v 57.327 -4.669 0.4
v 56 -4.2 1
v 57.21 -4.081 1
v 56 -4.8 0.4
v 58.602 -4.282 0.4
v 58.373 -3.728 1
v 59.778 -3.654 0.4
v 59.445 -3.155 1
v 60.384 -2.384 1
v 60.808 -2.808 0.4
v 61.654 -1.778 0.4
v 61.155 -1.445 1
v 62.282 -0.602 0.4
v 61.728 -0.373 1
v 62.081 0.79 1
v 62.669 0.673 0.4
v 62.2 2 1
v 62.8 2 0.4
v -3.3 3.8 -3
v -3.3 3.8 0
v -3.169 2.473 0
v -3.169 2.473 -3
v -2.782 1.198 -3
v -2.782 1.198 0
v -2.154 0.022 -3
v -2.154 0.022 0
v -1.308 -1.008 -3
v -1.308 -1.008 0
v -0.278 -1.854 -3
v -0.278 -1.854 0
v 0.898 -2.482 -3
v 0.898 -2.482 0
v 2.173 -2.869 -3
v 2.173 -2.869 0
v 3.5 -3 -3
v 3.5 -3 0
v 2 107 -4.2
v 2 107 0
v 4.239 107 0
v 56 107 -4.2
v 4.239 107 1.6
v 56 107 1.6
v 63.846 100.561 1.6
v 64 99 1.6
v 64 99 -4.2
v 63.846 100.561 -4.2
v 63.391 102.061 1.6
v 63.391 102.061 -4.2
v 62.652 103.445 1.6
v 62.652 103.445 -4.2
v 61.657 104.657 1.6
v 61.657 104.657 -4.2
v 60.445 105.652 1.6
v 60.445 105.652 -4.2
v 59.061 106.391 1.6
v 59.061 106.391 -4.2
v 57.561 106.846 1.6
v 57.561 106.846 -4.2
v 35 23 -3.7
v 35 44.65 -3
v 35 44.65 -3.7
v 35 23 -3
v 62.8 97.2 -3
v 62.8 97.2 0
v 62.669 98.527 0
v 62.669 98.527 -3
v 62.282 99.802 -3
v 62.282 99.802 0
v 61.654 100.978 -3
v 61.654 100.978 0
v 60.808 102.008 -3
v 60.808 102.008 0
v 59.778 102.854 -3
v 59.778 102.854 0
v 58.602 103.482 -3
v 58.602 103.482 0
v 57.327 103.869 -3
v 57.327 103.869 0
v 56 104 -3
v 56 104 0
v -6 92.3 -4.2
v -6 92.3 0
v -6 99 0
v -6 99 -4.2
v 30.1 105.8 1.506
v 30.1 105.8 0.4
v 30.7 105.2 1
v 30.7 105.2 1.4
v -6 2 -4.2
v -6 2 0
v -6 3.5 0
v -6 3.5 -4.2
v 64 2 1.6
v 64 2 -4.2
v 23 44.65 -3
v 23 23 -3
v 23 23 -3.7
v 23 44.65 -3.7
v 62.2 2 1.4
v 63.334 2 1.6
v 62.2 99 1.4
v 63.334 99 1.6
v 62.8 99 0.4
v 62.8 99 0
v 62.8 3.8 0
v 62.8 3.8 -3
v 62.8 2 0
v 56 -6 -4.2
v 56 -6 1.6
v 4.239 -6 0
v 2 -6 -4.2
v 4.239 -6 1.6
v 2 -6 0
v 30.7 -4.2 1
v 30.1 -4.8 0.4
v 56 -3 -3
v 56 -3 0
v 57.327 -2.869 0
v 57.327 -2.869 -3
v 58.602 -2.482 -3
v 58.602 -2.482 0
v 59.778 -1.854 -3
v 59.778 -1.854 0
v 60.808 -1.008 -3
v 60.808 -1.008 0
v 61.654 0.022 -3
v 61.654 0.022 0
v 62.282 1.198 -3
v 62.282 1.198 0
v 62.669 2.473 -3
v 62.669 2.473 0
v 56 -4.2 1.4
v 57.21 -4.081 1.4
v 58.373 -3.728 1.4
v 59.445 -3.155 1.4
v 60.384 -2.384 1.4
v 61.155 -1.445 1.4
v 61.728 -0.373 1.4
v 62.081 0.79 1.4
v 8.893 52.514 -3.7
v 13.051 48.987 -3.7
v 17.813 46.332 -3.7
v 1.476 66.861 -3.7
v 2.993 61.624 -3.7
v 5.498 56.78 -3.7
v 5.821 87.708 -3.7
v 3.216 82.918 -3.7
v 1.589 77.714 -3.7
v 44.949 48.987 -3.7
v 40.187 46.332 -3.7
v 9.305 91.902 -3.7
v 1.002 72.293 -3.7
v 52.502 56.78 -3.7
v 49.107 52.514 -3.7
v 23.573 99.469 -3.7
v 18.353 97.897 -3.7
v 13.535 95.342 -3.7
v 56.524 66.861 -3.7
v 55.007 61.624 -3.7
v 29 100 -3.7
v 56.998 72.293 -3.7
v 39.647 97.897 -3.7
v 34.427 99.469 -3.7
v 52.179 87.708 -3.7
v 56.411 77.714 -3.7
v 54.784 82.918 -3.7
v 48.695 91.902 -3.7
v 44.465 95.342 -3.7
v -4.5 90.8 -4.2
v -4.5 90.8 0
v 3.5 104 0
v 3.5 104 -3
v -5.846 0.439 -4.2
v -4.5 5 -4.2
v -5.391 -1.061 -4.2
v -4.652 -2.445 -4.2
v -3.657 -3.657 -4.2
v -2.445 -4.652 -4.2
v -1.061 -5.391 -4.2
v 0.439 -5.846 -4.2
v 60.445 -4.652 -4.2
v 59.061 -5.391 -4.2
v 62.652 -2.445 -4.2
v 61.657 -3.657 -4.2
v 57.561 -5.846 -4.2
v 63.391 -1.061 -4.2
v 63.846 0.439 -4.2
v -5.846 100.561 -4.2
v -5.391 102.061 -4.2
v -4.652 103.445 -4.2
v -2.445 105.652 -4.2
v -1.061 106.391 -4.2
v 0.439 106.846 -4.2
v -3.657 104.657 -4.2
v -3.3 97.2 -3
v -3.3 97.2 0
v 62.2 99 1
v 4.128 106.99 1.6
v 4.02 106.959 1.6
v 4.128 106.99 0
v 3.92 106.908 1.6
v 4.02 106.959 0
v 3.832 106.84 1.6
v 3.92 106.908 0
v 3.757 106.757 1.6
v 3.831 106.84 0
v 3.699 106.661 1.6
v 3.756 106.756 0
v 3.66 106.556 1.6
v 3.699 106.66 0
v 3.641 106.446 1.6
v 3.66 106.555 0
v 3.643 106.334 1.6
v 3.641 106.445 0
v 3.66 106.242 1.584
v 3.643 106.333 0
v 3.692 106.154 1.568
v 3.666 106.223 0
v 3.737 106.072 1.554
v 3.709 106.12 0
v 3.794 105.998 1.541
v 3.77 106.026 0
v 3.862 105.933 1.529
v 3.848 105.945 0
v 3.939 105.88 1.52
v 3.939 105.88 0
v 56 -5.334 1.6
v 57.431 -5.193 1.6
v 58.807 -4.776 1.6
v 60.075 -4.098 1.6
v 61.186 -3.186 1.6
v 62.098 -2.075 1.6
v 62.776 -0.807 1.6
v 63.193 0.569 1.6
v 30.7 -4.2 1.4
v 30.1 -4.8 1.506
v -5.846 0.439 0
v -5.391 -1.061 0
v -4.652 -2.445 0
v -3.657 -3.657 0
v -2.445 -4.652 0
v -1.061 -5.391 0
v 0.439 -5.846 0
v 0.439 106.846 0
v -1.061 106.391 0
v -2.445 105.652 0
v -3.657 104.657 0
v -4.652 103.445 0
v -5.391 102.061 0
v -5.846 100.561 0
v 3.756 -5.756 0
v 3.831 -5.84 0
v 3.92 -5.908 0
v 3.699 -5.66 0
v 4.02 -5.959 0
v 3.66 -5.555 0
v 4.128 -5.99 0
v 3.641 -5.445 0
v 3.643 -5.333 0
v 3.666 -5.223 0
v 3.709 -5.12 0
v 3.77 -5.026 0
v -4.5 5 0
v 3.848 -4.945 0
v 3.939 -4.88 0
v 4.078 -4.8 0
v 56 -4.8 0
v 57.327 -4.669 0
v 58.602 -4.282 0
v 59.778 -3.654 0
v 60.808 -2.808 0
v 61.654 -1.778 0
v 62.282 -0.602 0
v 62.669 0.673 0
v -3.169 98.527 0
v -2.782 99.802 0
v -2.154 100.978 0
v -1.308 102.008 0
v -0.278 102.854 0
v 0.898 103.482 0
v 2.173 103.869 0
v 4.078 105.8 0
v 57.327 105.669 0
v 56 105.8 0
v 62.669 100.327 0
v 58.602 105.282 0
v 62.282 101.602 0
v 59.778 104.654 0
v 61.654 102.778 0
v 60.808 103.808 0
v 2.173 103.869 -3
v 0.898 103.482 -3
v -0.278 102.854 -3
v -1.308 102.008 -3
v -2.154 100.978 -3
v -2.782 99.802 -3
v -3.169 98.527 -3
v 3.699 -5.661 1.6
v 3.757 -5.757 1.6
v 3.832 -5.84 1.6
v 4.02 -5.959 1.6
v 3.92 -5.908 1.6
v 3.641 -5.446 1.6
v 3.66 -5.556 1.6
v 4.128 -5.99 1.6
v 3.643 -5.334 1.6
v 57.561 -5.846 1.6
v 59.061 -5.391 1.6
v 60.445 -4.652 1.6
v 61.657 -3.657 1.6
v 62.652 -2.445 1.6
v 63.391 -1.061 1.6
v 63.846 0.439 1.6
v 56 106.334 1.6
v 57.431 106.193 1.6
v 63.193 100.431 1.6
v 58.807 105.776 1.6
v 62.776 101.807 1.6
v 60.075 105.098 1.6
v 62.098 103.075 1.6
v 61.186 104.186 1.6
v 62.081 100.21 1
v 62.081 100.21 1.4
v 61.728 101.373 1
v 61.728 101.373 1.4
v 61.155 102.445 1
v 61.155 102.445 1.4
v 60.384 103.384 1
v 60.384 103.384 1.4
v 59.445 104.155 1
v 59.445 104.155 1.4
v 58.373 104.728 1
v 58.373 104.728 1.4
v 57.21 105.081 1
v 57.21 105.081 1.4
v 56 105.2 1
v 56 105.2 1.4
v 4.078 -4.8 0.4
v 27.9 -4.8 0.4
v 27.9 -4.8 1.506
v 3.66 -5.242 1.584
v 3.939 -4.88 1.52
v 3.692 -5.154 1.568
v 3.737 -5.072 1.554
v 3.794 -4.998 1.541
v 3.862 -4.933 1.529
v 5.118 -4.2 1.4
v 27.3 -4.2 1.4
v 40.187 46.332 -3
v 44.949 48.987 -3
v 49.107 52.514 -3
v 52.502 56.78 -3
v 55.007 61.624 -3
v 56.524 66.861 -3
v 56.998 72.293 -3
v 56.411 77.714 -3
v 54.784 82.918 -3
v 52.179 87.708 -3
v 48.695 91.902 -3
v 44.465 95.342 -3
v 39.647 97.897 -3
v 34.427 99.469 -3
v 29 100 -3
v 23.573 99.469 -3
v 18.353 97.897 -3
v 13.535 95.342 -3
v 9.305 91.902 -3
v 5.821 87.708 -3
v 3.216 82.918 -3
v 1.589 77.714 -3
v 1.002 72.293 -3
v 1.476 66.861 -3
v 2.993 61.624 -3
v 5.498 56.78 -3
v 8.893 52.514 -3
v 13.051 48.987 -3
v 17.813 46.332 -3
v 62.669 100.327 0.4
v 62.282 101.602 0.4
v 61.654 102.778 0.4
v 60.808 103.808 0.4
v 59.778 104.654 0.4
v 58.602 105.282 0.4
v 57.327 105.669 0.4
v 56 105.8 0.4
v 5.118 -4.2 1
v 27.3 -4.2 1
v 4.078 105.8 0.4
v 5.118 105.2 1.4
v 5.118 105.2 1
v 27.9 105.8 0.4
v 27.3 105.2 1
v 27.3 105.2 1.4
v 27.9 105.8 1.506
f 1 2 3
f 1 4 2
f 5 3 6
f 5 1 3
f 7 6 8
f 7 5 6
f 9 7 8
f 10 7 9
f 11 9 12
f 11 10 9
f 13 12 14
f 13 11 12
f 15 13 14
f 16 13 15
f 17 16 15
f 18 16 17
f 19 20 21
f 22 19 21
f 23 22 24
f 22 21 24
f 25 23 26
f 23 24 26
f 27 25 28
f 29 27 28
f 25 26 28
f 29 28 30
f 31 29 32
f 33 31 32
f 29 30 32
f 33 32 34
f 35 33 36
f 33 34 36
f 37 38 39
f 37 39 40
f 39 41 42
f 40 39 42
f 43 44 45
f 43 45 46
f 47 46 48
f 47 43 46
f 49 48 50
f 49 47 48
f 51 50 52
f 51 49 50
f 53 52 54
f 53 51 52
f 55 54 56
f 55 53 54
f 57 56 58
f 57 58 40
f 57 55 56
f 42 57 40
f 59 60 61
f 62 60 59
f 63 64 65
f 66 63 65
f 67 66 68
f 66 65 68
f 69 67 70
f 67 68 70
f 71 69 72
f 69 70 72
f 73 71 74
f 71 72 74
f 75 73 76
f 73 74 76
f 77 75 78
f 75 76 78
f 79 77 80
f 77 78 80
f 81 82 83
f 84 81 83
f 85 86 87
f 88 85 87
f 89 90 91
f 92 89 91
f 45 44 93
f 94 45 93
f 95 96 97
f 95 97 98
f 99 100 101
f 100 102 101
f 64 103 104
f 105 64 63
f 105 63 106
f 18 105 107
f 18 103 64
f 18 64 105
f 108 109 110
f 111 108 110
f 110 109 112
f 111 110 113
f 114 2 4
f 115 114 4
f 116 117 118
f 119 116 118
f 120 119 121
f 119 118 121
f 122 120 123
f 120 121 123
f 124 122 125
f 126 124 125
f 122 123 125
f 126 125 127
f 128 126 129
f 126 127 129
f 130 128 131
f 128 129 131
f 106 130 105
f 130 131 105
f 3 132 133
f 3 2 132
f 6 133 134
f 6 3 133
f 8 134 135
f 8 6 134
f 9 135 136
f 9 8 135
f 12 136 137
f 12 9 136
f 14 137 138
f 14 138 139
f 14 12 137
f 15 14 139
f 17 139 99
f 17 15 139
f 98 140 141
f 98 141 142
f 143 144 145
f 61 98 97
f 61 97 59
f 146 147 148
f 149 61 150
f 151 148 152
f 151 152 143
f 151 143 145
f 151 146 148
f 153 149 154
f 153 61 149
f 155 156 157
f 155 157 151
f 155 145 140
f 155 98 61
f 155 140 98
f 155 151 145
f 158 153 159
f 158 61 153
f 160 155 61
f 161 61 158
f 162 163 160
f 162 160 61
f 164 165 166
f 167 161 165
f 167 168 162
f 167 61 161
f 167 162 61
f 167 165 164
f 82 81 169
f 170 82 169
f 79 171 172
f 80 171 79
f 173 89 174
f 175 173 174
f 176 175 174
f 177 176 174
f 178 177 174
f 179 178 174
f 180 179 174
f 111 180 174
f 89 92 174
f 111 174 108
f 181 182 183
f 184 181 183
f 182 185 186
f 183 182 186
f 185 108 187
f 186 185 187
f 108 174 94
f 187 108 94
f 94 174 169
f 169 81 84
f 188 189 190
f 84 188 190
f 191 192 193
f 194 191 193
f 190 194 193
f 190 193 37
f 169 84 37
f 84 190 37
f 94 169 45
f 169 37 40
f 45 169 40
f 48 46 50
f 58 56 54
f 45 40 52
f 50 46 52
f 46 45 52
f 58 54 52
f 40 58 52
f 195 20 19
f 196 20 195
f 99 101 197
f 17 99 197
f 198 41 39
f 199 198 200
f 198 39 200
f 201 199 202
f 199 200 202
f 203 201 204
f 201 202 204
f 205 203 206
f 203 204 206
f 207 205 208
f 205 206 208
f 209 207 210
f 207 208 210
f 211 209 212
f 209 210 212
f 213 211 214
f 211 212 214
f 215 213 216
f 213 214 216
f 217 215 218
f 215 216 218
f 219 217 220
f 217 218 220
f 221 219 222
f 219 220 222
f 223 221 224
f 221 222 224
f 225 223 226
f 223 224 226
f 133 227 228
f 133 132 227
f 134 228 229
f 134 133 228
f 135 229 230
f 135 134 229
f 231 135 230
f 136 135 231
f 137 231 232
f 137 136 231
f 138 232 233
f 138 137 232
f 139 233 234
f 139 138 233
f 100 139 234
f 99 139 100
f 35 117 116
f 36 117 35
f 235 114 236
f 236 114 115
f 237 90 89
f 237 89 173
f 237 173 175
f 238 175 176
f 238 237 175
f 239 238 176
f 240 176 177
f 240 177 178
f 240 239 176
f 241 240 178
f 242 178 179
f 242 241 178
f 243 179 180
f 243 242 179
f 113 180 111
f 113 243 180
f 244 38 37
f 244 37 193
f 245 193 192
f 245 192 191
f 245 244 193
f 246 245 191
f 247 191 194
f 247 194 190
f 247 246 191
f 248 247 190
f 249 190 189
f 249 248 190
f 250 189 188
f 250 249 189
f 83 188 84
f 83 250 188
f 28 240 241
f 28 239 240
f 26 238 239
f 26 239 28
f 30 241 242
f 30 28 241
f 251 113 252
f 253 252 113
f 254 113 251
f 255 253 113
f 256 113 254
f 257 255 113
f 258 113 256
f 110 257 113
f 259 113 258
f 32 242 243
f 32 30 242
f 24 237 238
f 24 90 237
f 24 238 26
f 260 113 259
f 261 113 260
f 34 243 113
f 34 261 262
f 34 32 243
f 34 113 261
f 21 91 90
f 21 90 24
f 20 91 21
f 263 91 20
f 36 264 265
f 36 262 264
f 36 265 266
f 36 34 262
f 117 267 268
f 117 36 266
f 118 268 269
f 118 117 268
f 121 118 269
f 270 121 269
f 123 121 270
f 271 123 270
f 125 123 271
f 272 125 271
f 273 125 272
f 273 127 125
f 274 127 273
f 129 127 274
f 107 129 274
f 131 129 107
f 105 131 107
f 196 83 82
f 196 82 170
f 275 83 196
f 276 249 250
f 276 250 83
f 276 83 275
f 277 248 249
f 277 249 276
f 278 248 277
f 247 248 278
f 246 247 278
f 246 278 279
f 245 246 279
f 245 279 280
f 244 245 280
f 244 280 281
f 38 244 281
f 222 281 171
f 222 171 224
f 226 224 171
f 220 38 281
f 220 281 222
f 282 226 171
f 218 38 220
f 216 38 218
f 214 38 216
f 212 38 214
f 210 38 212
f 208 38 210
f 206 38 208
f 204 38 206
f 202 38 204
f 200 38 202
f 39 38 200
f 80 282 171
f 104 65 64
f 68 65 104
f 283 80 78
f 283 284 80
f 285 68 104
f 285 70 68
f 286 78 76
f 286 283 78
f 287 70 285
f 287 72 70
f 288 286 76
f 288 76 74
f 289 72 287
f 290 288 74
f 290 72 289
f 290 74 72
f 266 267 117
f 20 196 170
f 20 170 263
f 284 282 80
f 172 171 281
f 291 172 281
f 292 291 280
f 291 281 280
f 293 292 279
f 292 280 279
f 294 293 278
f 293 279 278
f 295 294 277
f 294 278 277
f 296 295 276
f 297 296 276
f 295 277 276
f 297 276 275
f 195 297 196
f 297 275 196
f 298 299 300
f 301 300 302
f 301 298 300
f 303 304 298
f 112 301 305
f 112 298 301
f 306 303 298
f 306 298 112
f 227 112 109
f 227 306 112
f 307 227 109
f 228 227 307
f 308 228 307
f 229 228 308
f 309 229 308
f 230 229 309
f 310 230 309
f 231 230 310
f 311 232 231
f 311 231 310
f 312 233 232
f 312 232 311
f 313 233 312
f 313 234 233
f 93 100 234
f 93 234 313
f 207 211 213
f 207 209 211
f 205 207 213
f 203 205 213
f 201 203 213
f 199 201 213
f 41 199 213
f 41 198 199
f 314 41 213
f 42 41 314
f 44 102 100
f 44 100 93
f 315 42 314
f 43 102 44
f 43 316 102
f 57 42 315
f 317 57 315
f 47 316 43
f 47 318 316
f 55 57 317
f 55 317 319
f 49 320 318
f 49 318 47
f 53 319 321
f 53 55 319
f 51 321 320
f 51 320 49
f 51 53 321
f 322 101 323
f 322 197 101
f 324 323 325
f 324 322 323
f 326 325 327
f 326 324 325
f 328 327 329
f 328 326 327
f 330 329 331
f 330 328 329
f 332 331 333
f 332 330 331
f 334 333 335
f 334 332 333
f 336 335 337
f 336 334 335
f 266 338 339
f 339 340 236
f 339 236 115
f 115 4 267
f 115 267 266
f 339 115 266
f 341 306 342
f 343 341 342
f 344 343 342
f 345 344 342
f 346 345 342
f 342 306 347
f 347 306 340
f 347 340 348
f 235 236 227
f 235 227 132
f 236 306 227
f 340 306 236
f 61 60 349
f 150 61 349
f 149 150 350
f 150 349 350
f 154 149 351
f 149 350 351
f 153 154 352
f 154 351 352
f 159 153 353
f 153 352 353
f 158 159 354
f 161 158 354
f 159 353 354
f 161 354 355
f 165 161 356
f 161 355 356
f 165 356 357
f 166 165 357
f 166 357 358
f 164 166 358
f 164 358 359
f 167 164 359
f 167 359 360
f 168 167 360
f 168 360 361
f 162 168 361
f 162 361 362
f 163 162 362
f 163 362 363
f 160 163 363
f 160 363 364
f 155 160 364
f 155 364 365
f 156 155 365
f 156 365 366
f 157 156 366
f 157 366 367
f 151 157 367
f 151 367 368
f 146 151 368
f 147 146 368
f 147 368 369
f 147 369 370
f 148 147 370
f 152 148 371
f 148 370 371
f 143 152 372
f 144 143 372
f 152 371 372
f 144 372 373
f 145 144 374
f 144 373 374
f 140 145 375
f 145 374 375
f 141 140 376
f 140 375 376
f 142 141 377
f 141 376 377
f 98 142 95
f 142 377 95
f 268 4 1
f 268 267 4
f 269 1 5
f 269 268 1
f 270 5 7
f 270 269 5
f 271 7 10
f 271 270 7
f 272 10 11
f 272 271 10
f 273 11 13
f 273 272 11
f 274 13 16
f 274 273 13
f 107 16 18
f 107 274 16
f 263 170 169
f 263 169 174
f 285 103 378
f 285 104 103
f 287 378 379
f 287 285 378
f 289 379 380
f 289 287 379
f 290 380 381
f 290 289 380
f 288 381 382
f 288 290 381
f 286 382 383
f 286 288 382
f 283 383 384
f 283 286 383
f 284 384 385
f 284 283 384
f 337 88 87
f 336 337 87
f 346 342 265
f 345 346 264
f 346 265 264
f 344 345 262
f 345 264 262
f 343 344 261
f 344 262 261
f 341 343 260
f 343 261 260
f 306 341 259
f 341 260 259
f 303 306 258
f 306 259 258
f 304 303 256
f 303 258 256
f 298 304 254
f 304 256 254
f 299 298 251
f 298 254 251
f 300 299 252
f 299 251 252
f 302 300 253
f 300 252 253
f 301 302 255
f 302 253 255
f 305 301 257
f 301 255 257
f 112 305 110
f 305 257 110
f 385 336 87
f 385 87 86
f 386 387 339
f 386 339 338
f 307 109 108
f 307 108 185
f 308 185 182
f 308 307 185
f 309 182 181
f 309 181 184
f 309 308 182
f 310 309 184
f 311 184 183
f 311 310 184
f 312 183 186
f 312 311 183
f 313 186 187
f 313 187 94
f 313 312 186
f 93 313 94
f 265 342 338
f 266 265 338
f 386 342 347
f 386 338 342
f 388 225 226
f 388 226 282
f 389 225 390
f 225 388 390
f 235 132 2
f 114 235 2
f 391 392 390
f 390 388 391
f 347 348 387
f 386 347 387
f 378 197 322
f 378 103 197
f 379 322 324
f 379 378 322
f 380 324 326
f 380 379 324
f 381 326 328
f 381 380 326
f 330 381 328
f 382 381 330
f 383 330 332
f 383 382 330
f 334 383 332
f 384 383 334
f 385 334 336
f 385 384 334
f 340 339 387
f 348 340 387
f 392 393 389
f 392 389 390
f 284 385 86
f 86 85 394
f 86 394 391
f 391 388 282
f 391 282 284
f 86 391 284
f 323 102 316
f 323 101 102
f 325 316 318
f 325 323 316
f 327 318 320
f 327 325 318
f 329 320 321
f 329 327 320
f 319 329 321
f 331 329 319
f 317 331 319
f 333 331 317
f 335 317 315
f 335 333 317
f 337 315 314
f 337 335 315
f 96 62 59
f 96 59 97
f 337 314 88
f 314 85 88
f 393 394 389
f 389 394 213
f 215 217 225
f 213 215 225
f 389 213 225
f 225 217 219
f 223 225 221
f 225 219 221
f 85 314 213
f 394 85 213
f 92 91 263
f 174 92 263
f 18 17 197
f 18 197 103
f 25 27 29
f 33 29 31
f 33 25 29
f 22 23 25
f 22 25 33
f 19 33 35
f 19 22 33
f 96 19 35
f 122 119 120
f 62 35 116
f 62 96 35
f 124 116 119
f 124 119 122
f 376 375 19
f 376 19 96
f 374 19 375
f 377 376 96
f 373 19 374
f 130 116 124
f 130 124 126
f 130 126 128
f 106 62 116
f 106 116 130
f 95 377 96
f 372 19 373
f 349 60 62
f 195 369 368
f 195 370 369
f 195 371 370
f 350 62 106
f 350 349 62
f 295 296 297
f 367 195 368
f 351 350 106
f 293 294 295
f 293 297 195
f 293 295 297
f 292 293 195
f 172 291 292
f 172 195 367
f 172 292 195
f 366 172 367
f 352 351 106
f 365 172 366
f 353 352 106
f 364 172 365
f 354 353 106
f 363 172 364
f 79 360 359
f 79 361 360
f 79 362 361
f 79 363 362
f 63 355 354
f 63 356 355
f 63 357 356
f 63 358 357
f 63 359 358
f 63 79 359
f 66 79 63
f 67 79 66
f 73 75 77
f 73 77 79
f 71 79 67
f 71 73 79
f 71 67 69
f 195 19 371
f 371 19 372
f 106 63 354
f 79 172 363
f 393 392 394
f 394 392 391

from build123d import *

# Parameters (mm, degrees)
PAD_DEPTH       = 1.6
PAD_DEPTH_BACK  = 4.2
POCKET001_DEPTH = 3
POCKET002_DEPTH = 10
POCKET003_DEPTH = 3.7
POCKET_DEPTH    = 5


with BuildPart() as part:
    # Sketch → Pad (new body, two sides)
    with BuildSketch(Plane.XY) as pad_sk:
        with BuildLine():
            ThreePointArc((-6, 2), (-3.656854, -3.656854), (2, -6))
            Line((56, -6), (2, -6))
            ThreePointArc((56, -6), (61.656854, -3.656854), (64, 2))
            Line((64, 99), (64, 2))
            ThreePointArc((64, 99), (61.656854, 104.656854), (56, 107))
            Line((2, 107), (56, 107))
            ThreePointArc((2, 107), (-3.656854, 104.656854), (-6, 99))
            Line((-6, 92.3), (-6, 99))
            Line((-6, 92.3), (-4.5, 90.8))
            Line((-4.5, 90.8), (-4.5, 5))
            Line((-6, 3.5), (-4.5, 5))
            Line((-6, 2), (-6, 3.5))
        make_face()
    extrude(amount=PAD_DEPTH)
    extrude(pad_sk.sketch, amount=-PAD_DEPTH_BACK)

    # Sketch002 → Pocket001 (cut)
    with BuildSketch(Plane.XY):
        with BuildLine():
            ThreePointArc((3.5, 104), (-1.308326, 102.008326), (-3.3, 97.2))
            Line((-3.3, 3.8), (-3.3, 97.2))
            ThreePointArc((-3.3, 3.8), (-1.308326, -1.008326), (3.5, -3))
            Line((56, -3), (3.5, -3))
            ThreePointArc((56, -3), (60.808326, -1.008326), (62.8, 3.8))
            Line((62.8, 97.2), (62.8, 3.8))
            ThreePointArc((62.8, 97.2), (60.808326, 102.008326), (56, 104))
            Line((3.5, 104), (56, 104))
        make_face()
    extrude(amount=-POCKET001_DEPTH, mode=Mode.SUBTRACT)

    # Sketch003 → Pocket002 (cut)
    with BuildSketch(Plane.XY):
        Polygon((24.9, -1.8), (24.9, 102.8), (27.9, 105.8), (30.1, 105.8), (33.1, 102.8), (33.1, -1.8), (30.1, -4.8), (27.9, -4.8), align=None)
        with BuildLine():
            Line((3.93923, 105.880385), (5.117691, 105.2))
            Line((5.117691, 105.2), (-11.76077, 105.2))
            Line((-11.76077, 107), (-11.76077, 105.2))
            Line((4.23923, 107), (-11.76077, 107))
            ThreePointArc((4.23923, 107), (3.659675, 106.555291), (3.93923, 105.880385))
        make_face()
        with BuildLine():
            Line((3.93923, -4.880385), (5.117691, -4.2))
            Line((5.117691, -4.2), (-11.76077, -4.2))
            Line((-11.76077, -4.2), (-11.76077, -6))
            Line((-11.76077, -6), (4.23923, -6))
            ThreePointArc((3.93923, -4.880385), (3.659675, -5.555291), (4.23923, -6))
        make_face()
    extrude(amount=POCKET002_DEPTH, mode=Mode.SUBTRACT)

    # Sketch004 → Pocket003 (cut)
    with BuildSketch(Plane.XY):
        with BuildLine():
            ThreePointArc((35, 44.650411), (29, 100), (23, 44.650411))
            Line((23, 23), (23, 44.650411))
            Line((35, 23), (23, 23))
            Line((35, 44.650411), (35, 23))
        make_face()
    extrude(amount=-POCKET003_DEPTH, mode=Mode.SUBTRACT)

    # SubtractivePipe: sweep along a path in Sketch005
    with BuildLine(Plane.XY) as subtractivepipe_path:
        Line((-6, -6), (56, -6))
        ThreePointArc((56, -6), (61.656854, -3.656854), (64, 2))
        Line((64, 2), (64, 99))
        ThreePointArc((64, 99), (61.656854, 104.656854), (56, 107))
        Line((56, 107), (-6, 107))
    # Sketch001 → SubtractivePipe (sweep, cut)
    with BuildSketch(Plane.YZ):
        Polygon((-4.8, 0), (-4.8, 0.4), (-4.2, 1), (-4.2, 1.4), (-5.334256, 1.6), (-3.334256, 1.6), (-3.334256, 0), align=None)
    sweep(path=subtractivepipe_path.line, mode=Mode.SUBTRACT)

    # Sketch006 → Pocket (cut)
    with BuildSketch(Plane.XY):
        with BuildLine():
            Line((-6, -4), (56, -4))
            ThreePointArc((56, -4), (60.242641, -2.242641), (62, 2))
            Line((62, 2), (62, 99))
            ThreePointArc((62, 99), (60.242641, 103.242641), (56, 105))
            Line((56, 105), (-6, 105))
            Line((-6, 105), (-6, -4))
        make_face()
    extrude(amount=POCKET_DEPTH, mode=Mode.SUBTRACT)


solid = part.part
